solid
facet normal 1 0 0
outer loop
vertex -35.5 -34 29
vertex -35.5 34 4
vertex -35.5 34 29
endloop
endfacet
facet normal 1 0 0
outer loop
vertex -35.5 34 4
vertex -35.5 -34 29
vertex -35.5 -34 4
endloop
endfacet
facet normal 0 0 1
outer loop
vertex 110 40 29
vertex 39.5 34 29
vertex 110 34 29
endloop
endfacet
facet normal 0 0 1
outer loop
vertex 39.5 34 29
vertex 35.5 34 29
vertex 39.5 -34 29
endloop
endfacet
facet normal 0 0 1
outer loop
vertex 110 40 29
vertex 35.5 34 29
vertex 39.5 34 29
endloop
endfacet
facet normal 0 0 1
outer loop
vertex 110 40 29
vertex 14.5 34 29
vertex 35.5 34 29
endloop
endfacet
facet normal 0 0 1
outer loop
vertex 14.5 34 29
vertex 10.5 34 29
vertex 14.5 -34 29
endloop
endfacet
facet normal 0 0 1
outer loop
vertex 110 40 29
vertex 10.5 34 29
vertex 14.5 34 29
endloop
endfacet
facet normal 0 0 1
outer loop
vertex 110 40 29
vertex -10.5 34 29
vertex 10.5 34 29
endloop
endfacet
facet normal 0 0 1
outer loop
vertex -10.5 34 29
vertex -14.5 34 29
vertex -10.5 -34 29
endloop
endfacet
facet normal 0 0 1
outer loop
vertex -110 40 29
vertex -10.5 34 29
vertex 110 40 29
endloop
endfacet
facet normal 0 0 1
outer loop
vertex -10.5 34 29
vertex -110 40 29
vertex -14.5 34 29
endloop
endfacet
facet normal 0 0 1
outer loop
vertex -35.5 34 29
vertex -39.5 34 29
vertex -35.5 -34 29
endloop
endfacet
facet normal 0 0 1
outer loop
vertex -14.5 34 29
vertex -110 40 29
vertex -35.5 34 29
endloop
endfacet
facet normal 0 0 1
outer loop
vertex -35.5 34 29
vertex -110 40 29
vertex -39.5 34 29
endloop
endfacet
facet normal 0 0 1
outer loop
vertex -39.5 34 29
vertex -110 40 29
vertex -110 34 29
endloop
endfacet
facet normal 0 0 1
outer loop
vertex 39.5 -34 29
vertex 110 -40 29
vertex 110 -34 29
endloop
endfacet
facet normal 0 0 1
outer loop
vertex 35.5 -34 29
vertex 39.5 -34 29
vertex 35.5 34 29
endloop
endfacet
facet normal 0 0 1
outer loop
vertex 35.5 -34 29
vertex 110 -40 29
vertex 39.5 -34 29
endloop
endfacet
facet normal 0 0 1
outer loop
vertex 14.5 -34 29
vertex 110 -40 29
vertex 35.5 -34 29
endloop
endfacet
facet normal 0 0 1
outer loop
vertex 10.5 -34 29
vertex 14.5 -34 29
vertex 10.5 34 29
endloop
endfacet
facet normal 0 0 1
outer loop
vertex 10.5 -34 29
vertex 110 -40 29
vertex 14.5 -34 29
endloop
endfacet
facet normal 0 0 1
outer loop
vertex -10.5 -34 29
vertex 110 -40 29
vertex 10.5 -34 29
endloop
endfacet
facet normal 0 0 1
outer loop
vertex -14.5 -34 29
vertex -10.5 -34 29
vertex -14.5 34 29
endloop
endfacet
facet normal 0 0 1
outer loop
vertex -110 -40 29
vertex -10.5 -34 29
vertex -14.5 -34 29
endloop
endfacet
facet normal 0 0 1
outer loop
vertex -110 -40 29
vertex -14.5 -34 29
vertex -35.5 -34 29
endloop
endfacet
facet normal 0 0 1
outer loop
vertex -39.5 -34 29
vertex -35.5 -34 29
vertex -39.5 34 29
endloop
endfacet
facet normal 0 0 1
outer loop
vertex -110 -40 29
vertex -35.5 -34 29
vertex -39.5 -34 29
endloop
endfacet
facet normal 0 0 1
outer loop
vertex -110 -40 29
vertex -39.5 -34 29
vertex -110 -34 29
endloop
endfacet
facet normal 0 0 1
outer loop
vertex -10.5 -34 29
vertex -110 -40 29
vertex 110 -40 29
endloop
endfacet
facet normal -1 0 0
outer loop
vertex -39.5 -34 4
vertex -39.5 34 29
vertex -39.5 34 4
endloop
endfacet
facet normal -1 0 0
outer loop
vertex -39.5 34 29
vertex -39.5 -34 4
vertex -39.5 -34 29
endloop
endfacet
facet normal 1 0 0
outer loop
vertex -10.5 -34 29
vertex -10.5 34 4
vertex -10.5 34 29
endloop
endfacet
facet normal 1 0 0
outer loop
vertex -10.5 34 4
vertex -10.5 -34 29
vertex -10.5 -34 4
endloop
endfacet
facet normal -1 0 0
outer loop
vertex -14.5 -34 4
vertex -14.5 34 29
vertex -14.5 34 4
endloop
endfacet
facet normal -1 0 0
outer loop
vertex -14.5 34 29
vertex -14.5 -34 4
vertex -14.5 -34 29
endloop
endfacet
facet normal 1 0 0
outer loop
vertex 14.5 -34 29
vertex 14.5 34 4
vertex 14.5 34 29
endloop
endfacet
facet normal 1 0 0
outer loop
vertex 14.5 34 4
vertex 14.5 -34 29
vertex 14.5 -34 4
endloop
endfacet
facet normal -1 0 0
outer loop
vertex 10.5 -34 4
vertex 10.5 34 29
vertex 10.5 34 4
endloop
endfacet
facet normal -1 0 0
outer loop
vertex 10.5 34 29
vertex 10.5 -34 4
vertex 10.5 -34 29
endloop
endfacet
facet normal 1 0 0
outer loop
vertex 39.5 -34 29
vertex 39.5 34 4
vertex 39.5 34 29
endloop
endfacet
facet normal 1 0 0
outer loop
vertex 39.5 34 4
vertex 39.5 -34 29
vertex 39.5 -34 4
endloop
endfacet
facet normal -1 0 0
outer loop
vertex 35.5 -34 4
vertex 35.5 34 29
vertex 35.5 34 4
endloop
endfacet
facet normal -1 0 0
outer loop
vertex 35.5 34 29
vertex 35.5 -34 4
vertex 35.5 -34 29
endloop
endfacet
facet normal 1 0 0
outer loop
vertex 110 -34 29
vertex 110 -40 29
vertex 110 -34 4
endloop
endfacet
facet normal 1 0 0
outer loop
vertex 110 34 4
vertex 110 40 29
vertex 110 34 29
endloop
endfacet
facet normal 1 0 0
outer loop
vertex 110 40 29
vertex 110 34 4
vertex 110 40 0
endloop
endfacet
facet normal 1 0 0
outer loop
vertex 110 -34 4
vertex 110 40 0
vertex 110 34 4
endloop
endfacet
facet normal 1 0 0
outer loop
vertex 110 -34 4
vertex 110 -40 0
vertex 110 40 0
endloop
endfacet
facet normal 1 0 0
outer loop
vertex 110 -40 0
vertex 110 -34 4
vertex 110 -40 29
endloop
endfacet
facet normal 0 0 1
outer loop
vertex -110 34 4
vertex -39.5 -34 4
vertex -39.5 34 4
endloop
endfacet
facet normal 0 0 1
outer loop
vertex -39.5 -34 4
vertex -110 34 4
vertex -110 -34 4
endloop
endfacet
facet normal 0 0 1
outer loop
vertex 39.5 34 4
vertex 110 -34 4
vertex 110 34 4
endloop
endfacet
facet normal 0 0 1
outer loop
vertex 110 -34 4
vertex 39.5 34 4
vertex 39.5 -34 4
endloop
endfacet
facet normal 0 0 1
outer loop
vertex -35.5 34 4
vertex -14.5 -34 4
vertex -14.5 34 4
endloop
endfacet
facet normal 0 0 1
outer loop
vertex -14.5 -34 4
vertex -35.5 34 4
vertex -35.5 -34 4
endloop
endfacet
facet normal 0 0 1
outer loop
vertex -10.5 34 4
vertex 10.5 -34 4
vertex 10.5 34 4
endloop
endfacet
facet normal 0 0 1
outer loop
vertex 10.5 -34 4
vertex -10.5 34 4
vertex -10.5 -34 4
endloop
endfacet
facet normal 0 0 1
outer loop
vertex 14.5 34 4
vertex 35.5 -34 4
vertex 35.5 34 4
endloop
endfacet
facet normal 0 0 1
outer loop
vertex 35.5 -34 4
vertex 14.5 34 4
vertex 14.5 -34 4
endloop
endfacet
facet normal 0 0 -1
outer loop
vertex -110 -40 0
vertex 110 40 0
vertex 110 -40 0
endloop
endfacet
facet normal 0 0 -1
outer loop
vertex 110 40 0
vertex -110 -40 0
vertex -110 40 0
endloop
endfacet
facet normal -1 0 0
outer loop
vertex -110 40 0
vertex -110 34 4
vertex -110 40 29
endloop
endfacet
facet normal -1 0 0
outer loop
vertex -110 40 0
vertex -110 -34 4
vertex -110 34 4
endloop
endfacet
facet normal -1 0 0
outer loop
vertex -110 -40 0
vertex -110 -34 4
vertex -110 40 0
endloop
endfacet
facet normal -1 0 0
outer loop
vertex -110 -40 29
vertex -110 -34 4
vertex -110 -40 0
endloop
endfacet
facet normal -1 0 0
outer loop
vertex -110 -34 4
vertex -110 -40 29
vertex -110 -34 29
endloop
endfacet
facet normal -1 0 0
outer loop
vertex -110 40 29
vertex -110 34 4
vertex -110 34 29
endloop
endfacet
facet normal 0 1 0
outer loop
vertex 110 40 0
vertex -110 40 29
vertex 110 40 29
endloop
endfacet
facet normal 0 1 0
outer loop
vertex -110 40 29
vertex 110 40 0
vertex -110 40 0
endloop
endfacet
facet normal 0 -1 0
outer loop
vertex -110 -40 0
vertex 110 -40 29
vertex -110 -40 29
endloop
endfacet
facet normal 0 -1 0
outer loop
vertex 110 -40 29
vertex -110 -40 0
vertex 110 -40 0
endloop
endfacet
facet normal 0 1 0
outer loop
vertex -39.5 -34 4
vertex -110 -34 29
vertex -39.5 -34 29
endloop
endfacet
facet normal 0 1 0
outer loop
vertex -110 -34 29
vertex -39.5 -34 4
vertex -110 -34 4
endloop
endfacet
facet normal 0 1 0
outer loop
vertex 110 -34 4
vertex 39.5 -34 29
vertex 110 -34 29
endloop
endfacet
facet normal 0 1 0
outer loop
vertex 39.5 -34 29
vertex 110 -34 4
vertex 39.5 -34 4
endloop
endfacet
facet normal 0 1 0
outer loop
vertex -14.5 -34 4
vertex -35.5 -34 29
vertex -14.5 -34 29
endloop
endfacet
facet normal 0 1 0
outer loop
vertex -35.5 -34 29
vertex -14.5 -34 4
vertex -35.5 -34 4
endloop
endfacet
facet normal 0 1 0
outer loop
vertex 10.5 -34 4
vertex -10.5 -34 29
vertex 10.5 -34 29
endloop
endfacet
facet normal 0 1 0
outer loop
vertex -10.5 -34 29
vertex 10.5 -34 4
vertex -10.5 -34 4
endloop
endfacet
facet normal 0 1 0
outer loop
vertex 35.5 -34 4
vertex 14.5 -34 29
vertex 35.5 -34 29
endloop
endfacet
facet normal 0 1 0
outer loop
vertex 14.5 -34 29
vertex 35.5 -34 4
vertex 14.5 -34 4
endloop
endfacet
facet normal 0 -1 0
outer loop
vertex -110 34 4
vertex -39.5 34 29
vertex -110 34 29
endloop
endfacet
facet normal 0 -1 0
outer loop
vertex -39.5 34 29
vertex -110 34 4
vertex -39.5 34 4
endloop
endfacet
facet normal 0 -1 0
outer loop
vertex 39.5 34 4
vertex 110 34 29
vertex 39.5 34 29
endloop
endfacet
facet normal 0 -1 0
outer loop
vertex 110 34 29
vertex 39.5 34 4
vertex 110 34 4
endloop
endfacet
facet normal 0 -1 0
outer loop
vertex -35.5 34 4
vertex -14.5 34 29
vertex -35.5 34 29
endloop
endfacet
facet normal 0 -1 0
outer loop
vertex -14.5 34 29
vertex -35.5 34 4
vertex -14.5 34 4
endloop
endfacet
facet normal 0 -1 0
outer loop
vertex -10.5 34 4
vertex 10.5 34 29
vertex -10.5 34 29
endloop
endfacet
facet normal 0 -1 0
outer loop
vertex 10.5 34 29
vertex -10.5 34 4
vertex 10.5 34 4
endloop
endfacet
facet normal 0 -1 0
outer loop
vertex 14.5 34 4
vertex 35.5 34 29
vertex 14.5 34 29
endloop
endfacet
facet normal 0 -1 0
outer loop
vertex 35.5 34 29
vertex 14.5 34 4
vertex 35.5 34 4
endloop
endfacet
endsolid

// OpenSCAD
$fn = 32;

// ----------------------------------------------------------------------
// Rib frame 220 x 80 x 29
// 4 ribs at 25 mm pitch
// ----------------------------------------------------------------------

// --- parameters (mm) ---
frame = [220, 80, 4];  // base plate size (x, y, z)
rail_w = 6;            // side rail width
ribs = 4;              // number of ribs
rib_t = 4;             // rib thickness
rib_h = 25;            // rib height above the base plate
pitch = 25;            // pitch between rib centres

// --- derived feature positions (mm) ---
span = (ribs - 1) * pitch;          // = 75   distance between the outer ribs
origin_x = -span / 2;               // = -37.5   X of the first rib
rib_len = frame[1] - 2 * rail_w + 2;  // = 70   rib length, 1 mm into each rail
feature_centers = [
  [origin_x + 0 * pitch, 0],
  [origin_x + 1 * pitch, 0],
  [origin_x + 2 * pitch, 0],
  [origin_x + 3 * pitch, 0]
];   // rib centre line, drives the rib loop

// base plate, two side rails, then the ribs read straight off feature_centers
union() {
  translate([-frame[0] / 2, -frame[1] / 2, 0]) cube(frame);
  translate([-frame[0] / 2, -frame[1] / 2, 0]) cube([frame[0], rail_w, frame[2] + rib_h]);
  translate([-frame[0] / 2, frame[1] / 2 - rail_w, 0]) cube([frame[0], rail_w, frame[2] + rib_h]);
  for (centre = feature_centers)
    translate([centre[0] - rib_t / 2, centre[1] - rib_len / 2, frame[2] - 1])
      cube([rib_t, rib_len, rib_h + 1]);
}
